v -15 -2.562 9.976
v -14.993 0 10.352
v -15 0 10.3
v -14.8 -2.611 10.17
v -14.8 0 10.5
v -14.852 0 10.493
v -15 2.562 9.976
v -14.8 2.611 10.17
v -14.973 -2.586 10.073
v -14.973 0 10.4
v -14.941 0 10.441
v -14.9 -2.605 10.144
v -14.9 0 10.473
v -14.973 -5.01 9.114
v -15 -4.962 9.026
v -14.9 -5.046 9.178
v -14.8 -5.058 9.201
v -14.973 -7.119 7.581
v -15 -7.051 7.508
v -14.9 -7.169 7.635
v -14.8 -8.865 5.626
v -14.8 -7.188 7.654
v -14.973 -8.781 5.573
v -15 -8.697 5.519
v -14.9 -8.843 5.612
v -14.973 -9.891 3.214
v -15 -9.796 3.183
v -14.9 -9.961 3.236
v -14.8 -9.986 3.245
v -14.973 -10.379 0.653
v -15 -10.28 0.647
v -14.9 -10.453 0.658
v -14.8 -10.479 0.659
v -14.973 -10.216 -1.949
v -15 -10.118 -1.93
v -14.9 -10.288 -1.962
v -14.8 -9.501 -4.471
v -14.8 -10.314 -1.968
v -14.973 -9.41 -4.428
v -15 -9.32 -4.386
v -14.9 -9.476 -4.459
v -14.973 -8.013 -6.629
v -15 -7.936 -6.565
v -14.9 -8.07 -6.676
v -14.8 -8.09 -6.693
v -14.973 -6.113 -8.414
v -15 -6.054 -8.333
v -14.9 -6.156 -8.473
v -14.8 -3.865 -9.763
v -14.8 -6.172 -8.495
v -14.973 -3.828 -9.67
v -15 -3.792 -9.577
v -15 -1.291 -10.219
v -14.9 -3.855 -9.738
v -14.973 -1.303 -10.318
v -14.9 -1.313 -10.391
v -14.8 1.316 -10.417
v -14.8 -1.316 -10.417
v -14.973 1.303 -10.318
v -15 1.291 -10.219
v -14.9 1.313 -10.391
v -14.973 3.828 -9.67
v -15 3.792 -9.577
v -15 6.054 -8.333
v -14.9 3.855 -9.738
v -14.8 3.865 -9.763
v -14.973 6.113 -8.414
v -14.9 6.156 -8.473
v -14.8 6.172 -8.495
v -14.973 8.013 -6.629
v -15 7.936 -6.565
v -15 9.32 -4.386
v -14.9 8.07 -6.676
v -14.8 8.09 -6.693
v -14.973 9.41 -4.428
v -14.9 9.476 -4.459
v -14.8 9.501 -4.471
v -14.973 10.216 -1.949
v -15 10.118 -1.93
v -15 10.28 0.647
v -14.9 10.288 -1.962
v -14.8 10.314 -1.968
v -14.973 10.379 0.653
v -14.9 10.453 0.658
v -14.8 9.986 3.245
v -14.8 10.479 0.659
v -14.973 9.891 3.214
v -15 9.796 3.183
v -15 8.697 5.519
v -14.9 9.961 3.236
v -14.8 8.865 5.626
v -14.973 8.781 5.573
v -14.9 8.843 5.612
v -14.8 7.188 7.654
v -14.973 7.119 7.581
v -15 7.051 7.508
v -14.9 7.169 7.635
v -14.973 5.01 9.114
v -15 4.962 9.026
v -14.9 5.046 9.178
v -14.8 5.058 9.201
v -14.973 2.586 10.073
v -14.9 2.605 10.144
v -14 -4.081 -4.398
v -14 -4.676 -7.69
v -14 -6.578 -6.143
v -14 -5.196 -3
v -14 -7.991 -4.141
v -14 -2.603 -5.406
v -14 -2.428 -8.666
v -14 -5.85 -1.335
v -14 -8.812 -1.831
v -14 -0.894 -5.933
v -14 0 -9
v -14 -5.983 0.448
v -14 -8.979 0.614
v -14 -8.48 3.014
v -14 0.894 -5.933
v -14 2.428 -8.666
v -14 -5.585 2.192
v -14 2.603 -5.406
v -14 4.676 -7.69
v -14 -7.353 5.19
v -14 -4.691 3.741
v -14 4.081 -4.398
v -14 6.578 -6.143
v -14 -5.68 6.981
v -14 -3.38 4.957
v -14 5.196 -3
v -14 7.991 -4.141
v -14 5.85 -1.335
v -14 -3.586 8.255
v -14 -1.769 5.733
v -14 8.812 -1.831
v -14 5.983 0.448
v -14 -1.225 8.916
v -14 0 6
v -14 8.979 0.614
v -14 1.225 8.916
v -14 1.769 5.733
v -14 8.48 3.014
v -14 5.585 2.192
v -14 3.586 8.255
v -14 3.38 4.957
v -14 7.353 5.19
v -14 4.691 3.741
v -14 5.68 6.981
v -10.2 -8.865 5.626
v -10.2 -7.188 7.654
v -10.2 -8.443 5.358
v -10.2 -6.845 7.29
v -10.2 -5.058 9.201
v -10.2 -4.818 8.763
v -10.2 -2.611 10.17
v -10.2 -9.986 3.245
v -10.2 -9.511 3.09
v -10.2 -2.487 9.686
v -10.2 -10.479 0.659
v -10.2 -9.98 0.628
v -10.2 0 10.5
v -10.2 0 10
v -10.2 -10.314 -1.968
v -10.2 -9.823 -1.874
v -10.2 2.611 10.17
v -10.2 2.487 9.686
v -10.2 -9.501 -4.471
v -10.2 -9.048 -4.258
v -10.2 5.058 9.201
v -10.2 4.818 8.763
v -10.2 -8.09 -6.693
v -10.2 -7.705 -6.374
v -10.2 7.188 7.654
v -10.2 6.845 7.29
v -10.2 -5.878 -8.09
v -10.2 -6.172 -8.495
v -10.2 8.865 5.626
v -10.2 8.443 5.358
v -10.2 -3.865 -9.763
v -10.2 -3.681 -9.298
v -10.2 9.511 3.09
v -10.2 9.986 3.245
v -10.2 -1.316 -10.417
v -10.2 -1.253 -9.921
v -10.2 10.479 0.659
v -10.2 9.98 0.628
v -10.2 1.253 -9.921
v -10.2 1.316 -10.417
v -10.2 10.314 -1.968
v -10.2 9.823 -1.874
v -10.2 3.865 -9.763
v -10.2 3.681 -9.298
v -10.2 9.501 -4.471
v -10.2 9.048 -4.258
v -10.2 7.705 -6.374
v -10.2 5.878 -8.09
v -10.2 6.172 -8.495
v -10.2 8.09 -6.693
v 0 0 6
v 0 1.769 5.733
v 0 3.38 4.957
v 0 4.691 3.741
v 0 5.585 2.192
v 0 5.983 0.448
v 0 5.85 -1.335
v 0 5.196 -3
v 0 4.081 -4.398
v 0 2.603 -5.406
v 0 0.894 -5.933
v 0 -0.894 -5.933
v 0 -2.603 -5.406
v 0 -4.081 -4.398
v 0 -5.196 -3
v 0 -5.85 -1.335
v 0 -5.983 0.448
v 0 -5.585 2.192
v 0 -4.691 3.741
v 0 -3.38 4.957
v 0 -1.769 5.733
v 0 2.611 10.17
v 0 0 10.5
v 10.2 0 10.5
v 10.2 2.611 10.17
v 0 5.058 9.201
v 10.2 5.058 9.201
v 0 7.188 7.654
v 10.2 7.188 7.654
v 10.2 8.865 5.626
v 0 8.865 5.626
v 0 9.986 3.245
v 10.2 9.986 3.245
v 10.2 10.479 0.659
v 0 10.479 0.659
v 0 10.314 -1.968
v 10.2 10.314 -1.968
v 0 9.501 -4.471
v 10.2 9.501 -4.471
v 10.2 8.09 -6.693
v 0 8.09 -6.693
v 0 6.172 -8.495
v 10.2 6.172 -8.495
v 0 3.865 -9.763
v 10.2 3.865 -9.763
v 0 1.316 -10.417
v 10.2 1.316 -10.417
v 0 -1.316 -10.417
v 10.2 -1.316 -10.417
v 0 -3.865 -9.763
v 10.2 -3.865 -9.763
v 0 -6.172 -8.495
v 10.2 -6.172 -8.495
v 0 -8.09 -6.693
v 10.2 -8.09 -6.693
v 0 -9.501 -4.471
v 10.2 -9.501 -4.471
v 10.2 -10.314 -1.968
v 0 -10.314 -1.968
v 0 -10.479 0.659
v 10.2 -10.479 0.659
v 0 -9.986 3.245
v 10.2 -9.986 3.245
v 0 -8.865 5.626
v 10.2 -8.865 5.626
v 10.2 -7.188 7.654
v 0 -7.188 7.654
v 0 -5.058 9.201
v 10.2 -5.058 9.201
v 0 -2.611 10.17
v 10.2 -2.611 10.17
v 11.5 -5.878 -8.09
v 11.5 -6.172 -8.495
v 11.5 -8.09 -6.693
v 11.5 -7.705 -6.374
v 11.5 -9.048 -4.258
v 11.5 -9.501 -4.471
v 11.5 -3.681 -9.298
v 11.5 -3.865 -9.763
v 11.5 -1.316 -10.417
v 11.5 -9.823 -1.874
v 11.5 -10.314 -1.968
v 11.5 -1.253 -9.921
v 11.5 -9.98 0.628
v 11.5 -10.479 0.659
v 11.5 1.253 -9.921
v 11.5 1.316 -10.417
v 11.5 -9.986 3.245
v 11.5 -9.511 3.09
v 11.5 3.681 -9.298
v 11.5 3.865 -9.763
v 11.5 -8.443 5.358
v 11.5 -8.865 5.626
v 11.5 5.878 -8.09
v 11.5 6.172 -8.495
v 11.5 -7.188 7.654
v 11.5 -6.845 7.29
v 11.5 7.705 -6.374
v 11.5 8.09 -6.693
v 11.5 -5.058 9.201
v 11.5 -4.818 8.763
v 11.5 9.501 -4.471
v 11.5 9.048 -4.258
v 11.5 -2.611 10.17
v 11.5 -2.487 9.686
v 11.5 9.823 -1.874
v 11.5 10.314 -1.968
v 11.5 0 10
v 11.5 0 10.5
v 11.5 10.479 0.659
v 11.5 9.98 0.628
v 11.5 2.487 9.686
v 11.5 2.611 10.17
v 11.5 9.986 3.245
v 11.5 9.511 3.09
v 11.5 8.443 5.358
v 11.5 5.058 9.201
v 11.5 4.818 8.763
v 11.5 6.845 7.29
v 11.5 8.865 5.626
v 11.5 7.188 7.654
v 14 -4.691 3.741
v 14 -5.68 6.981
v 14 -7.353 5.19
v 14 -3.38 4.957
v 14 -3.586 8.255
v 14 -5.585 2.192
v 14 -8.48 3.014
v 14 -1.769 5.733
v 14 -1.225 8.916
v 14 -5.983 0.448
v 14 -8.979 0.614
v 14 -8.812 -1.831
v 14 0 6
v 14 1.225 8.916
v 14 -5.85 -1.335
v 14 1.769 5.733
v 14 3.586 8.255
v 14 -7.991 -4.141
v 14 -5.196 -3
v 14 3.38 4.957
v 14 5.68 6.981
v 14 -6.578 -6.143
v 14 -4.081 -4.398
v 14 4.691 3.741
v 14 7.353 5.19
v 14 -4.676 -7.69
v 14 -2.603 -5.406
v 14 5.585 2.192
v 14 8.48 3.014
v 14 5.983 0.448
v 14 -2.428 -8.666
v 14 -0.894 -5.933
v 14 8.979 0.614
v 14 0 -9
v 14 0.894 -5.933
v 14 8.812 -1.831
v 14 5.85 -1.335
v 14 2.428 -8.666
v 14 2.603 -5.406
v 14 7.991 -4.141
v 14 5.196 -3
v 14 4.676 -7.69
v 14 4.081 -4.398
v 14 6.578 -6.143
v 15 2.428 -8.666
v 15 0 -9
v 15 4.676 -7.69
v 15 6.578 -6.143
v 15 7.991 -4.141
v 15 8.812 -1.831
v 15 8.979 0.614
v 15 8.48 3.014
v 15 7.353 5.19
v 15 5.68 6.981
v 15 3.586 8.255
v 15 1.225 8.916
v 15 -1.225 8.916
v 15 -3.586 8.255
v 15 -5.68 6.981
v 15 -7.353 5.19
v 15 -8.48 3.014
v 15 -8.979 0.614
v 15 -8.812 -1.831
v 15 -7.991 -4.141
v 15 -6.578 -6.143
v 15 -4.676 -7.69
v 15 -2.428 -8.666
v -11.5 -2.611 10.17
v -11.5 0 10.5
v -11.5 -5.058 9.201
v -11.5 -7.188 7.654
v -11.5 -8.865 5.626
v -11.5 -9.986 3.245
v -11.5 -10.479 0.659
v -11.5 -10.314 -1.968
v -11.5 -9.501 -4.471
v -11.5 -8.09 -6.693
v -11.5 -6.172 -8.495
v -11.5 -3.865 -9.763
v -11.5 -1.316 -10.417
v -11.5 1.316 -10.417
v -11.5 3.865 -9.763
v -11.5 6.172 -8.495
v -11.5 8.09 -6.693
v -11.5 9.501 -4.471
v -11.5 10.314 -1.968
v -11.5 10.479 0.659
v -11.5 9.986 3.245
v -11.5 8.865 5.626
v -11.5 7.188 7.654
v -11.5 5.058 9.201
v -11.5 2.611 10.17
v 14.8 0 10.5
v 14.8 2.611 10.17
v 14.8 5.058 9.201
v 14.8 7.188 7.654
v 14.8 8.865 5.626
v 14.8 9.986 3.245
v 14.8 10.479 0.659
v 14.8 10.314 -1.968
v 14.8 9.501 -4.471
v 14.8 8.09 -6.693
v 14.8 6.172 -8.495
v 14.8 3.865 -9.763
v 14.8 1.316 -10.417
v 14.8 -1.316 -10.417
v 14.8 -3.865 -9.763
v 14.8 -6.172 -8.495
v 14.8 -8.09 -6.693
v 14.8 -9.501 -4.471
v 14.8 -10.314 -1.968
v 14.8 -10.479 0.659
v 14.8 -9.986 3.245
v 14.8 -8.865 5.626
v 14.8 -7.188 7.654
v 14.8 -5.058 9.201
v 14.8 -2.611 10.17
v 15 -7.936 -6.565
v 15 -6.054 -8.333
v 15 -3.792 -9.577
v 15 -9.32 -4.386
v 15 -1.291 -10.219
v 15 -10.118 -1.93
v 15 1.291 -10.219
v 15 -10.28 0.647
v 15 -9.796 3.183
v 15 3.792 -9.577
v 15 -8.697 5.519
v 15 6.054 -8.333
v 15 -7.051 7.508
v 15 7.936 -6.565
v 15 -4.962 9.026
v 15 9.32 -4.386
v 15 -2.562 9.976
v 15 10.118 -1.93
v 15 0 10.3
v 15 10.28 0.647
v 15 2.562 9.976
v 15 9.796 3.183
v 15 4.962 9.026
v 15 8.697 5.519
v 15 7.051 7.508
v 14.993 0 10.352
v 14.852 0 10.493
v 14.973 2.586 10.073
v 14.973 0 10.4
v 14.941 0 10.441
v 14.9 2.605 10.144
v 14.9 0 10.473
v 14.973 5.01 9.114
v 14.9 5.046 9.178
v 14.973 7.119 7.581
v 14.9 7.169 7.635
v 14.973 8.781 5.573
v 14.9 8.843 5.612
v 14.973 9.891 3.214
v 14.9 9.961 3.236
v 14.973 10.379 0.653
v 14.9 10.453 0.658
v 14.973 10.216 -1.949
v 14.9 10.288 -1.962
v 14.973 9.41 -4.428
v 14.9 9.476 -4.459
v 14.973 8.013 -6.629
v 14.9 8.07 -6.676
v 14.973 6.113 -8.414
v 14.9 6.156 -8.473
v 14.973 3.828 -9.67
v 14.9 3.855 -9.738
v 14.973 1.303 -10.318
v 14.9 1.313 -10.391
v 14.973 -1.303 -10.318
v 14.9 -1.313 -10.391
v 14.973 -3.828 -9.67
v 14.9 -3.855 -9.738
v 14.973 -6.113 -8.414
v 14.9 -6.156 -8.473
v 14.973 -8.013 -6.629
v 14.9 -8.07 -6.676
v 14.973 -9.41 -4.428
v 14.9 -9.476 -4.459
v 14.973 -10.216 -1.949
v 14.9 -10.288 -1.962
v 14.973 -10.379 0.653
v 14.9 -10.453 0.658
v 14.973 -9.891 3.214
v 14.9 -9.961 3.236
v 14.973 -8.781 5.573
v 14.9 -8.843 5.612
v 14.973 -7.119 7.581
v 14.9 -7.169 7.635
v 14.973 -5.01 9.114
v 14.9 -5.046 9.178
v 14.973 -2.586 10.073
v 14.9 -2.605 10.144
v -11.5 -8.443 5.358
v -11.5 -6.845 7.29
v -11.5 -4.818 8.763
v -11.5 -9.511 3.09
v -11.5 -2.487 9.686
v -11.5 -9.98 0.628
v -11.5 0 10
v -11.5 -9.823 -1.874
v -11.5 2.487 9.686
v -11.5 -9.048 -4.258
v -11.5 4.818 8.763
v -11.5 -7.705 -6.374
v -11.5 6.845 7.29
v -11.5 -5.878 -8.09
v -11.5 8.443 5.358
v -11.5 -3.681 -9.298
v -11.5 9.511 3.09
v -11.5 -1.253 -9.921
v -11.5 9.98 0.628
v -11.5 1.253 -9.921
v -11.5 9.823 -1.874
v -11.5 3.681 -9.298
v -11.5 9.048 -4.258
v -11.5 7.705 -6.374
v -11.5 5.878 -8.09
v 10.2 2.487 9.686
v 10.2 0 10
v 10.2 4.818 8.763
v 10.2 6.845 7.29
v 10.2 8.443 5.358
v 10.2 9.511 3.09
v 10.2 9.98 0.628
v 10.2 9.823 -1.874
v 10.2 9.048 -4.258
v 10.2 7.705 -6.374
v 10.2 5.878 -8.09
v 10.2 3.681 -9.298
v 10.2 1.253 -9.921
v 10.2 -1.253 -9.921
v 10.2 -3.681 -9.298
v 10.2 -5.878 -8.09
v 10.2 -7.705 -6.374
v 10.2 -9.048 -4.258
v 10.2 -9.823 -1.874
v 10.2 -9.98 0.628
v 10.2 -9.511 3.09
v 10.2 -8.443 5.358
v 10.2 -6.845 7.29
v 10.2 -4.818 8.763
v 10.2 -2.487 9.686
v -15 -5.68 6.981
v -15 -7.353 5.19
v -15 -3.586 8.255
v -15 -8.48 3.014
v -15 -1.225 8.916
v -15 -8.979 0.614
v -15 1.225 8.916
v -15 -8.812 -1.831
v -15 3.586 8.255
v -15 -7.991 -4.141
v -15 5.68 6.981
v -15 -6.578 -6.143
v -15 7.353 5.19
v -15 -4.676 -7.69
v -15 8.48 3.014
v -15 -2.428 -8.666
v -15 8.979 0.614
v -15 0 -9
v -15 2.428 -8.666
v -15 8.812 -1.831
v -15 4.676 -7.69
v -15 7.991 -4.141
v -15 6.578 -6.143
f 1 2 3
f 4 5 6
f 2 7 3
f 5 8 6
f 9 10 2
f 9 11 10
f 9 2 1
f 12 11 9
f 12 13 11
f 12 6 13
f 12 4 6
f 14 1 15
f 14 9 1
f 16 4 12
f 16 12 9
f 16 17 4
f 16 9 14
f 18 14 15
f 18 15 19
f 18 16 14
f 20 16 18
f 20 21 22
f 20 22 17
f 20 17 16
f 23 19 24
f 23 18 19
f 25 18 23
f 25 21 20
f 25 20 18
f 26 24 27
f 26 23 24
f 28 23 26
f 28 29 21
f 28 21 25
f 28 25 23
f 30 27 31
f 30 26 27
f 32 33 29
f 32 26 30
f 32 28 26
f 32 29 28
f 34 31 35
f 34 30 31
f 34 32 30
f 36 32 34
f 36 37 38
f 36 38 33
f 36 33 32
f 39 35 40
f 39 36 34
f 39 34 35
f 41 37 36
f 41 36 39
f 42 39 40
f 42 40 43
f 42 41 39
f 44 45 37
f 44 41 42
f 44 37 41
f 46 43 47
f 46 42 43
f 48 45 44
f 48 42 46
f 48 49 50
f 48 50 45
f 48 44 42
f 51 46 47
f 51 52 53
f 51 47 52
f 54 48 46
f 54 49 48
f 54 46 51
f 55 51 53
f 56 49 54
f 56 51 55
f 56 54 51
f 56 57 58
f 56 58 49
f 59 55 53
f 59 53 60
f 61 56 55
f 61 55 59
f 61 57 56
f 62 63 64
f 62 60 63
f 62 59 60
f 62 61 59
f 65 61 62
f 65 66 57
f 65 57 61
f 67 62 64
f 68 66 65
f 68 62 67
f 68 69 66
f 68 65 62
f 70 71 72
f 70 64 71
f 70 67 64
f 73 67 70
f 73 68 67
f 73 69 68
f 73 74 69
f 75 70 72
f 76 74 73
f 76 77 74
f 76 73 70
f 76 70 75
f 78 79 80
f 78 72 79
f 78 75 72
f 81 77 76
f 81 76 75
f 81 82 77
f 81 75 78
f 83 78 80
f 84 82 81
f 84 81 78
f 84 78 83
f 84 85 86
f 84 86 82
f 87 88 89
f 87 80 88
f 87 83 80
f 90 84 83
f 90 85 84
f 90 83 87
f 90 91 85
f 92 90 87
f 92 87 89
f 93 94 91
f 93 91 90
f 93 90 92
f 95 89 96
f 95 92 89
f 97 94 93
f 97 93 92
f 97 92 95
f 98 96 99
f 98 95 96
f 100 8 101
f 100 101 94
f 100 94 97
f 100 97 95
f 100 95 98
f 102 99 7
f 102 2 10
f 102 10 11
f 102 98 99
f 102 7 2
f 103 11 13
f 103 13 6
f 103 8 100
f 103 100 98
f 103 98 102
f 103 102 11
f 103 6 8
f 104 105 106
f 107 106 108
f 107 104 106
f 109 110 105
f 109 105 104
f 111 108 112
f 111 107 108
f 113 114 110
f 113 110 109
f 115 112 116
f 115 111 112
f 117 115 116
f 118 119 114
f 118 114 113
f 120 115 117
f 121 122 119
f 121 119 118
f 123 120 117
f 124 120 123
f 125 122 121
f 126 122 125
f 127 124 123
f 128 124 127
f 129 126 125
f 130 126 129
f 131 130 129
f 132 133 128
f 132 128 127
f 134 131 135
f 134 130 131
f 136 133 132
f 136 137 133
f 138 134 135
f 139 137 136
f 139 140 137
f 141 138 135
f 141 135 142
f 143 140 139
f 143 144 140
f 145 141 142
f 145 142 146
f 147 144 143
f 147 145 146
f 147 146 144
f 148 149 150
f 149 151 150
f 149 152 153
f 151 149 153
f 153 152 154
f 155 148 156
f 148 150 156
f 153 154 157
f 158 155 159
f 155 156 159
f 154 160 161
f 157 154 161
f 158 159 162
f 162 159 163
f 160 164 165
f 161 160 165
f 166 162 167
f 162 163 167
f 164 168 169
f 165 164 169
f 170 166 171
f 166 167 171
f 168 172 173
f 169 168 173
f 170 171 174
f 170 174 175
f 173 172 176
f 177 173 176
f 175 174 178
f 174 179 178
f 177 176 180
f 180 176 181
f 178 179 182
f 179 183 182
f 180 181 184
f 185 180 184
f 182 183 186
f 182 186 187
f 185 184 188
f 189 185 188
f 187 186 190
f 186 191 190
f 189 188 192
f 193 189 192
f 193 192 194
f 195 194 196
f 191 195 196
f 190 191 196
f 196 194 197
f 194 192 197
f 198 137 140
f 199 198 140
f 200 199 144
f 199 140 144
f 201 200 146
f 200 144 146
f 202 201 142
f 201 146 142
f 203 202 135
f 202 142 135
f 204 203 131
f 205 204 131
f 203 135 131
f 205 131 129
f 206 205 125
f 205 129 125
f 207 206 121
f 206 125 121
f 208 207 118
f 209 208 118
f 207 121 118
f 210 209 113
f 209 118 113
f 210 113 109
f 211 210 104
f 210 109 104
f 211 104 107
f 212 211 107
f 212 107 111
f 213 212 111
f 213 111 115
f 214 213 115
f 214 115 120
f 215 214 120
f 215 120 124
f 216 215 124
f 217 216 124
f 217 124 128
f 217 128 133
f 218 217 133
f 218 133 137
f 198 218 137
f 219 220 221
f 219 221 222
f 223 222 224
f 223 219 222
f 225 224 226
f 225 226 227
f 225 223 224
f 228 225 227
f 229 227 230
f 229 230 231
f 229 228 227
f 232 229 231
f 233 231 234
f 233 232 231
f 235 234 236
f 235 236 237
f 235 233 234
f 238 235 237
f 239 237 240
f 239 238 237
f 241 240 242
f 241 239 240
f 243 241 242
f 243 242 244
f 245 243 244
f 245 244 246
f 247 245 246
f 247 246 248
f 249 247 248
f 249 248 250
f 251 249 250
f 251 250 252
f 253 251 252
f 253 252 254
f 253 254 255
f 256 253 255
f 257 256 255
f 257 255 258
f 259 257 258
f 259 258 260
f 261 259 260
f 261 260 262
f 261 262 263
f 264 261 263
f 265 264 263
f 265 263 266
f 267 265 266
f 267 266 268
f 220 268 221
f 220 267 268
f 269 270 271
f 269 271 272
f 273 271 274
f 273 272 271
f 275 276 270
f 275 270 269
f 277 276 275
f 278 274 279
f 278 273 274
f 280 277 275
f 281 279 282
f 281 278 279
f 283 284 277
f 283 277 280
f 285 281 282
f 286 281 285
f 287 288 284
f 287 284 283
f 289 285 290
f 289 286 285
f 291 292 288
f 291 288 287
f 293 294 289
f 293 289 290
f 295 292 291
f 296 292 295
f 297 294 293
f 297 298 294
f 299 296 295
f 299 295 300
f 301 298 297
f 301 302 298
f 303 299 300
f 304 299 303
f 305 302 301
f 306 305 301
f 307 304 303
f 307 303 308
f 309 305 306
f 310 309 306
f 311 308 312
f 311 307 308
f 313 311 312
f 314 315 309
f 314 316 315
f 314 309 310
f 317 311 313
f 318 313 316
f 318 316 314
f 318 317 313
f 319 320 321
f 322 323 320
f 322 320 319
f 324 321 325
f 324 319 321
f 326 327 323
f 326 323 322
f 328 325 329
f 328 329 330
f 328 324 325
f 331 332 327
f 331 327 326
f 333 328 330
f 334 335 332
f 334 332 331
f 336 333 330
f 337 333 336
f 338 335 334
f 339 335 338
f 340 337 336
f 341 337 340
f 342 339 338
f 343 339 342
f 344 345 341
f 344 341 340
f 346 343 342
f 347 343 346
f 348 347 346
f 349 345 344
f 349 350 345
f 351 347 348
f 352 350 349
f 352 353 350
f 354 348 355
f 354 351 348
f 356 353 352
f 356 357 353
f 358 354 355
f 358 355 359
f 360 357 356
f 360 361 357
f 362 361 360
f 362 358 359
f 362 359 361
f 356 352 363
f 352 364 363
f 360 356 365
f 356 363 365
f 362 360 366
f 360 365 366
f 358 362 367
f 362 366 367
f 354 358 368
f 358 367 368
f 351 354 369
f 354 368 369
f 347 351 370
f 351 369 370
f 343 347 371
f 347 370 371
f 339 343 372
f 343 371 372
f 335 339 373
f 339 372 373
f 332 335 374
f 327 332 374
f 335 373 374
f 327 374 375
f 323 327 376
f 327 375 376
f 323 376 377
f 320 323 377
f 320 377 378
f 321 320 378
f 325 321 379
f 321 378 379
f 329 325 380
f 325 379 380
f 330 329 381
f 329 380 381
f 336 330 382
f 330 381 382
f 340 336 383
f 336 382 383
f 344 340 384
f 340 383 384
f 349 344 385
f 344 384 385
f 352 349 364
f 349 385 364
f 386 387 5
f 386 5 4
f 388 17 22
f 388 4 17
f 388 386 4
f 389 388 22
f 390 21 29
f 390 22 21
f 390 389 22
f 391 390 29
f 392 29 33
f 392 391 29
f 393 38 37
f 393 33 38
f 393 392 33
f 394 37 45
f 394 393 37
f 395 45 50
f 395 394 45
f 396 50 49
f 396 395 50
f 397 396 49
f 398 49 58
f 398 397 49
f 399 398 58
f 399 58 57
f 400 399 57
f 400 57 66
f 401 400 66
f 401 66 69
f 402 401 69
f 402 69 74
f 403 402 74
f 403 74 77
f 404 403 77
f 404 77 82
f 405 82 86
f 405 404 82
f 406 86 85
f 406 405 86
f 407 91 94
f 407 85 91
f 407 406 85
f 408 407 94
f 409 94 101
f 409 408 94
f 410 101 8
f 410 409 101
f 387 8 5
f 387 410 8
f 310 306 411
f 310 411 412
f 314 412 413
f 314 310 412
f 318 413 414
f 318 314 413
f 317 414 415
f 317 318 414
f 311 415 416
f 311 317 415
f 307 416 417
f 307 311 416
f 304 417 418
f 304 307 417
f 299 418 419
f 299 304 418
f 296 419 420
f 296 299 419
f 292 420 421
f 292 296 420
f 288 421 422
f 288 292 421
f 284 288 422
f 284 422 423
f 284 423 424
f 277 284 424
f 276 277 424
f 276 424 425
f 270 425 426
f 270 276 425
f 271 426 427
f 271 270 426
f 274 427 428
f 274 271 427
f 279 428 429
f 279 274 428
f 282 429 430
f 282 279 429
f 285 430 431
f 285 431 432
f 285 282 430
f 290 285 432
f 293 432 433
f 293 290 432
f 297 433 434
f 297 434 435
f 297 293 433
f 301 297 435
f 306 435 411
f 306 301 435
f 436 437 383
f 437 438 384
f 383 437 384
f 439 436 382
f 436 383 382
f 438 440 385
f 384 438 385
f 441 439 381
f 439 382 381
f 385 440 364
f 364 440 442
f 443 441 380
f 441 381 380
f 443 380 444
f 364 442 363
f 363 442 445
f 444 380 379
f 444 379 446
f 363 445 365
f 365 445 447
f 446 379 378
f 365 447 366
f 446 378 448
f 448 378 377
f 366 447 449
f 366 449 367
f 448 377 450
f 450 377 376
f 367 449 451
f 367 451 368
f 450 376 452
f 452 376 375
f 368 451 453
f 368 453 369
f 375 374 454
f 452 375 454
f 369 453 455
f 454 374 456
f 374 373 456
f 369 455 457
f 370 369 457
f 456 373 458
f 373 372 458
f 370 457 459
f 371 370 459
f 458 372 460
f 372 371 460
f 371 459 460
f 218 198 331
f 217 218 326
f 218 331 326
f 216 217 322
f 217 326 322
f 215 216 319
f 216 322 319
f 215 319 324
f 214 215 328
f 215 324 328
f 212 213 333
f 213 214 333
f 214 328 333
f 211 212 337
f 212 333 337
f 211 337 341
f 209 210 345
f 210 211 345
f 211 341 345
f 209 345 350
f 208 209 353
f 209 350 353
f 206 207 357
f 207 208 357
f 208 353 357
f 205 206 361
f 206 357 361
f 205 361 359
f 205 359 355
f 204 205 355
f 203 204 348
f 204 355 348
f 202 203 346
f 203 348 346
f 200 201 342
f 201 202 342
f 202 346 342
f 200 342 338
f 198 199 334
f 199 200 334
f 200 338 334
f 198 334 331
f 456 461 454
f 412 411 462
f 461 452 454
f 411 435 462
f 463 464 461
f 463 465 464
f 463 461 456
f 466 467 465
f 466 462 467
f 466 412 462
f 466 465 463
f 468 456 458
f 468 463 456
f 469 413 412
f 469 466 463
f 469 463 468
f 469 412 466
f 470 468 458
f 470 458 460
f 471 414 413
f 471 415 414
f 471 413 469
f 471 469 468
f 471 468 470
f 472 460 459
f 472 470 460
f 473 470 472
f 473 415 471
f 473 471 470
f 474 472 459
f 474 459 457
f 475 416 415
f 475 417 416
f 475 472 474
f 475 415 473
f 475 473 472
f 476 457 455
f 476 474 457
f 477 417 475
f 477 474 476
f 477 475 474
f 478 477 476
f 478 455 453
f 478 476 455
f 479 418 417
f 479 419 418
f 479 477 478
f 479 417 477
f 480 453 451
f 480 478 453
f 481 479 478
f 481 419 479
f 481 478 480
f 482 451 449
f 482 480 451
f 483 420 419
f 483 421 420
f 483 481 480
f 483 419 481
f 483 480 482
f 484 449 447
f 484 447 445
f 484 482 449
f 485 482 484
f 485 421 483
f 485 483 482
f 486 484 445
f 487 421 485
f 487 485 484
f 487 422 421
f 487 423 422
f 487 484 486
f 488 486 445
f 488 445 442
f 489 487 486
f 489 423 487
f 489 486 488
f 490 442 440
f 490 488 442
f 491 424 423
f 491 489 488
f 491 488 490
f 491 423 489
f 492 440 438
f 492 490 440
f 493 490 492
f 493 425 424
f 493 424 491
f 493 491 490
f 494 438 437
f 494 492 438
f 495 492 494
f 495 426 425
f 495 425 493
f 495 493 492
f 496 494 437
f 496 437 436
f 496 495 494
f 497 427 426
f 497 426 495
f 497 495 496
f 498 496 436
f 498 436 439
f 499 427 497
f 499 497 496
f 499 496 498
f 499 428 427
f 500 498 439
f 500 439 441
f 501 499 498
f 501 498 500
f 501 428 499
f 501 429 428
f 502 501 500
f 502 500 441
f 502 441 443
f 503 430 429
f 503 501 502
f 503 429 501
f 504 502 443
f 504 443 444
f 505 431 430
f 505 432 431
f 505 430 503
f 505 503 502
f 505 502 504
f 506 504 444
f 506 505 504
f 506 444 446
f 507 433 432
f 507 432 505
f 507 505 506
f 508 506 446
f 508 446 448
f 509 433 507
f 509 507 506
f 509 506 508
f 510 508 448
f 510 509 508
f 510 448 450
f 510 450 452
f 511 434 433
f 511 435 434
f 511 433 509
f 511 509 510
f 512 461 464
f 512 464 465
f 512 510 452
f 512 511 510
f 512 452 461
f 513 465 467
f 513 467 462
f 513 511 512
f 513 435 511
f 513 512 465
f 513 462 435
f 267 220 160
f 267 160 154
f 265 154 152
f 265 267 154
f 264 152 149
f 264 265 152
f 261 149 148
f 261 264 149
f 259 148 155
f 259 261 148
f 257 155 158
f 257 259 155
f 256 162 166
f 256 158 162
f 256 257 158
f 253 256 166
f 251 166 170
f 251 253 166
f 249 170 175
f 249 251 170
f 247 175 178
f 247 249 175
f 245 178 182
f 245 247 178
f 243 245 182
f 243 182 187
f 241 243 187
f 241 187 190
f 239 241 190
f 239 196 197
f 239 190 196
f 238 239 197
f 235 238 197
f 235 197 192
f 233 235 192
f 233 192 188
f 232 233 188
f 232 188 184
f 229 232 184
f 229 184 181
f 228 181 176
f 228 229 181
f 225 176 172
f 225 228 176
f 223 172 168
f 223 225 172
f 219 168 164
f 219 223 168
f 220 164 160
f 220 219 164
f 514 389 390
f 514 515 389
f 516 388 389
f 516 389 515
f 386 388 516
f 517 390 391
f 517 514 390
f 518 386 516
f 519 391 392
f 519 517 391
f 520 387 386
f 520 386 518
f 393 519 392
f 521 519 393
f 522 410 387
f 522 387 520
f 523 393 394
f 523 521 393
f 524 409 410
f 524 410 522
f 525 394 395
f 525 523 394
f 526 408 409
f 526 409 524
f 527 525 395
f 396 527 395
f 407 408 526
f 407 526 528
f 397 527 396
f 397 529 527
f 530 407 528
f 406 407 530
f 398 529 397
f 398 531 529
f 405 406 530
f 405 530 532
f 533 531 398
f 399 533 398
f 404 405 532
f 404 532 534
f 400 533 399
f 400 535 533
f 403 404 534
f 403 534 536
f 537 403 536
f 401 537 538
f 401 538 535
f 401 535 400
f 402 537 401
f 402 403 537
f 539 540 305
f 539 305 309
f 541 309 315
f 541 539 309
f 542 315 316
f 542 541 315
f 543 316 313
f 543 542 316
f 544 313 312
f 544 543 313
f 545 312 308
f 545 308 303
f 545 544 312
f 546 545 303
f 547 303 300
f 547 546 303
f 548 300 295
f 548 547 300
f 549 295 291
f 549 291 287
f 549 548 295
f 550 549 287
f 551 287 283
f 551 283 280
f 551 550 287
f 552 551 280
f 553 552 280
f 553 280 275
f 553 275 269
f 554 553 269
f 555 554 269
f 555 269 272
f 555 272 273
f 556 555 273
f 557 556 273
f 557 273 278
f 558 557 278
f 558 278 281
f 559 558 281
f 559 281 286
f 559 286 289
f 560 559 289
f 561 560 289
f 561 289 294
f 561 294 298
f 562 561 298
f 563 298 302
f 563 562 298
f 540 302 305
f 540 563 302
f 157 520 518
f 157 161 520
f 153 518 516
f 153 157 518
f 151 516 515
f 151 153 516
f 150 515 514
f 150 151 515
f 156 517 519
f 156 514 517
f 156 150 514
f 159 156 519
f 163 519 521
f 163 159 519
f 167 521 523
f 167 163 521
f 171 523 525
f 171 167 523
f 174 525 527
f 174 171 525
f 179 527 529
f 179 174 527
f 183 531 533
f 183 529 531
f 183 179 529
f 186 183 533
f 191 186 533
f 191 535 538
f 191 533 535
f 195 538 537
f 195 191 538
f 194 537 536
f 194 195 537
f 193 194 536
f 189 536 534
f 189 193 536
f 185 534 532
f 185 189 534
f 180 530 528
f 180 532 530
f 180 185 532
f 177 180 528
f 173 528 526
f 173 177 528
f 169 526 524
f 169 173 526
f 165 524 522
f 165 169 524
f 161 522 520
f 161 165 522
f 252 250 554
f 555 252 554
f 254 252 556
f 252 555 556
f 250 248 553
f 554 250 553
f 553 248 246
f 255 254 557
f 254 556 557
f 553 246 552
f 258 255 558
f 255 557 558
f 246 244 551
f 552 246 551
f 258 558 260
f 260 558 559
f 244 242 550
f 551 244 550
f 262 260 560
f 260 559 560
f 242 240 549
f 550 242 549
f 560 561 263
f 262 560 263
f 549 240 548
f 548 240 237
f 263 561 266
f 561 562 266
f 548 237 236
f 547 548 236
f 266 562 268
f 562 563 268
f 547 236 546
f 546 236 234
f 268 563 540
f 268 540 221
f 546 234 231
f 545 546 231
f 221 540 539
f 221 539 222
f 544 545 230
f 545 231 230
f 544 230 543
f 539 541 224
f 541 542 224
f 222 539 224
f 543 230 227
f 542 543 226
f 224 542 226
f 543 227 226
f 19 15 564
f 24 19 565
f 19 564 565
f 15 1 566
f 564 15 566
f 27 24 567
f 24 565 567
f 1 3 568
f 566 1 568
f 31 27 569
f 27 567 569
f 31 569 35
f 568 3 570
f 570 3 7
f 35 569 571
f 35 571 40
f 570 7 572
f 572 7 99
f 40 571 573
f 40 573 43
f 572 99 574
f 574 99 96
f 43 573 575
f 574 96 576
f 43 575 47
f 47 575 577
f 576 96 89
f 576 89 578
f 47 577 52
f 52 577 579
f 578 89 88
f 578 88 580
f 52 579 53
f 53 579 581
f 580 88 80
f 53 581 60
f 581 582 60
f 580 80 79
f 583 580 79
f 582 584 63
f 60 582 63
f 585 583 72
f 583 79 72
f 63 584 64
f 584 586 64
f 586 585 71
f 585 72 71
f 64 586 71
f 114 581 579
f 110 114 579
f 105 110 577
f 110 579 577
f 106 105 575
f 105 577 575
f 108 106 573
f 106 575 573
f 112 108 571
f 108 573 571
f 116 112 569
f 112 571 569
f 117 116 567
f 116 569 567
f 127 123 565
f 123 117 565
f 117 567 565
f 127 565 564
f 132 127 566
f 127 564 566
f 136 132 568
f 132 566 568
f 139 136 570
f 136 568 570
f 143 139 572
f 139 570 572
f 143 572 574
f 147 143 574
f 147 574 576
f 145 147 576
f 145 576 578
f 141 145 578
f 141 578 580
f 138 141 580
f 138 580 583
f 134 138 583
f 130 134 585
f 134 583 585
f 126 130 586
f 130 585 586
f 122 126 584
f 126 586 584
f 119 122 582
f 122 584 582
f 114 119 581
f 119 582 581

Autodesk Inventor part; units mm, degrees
ref_plane "YZ Plane" through (0, 0, 0) normal (1, 0, 0) x (0, 1, 0)
ref_plane "XZ Plane" through (0, 0, 0) normal (0, 1, 0) x (-1, 0, 0)
ref_plane "XY Plane" through (0, 0, 0) normal (0, 0, 1) x (1, 0, 0)
sketch "Schizzo1" plane through (0, 0, 0) normal (0, 1, 0) x (-1, 0, 0)
  line L0 (-15, 6) -> (-15, 10.5)
  line L1 (-15, 10.5) -> (-11.5, 10.5)
  line L2 (-11.5, 10.5) -> (-11.5, 10)
  line L3 (-11.5, 10) -> (-10.2, 10)
  line L4 (-10.2, 10) -> (-10.2, 10.5)
  line L5 (-10.2, 10.5) -> (0, 10.5)
  line L6 (0, 10.5) -> (0, 6)
  line L7 (0, 6) -> (-15, 6)
  line L8 (0, 0) -> (5.7518, 0)
  dimension "d0" = 12
  dimension "d2" = 21
  dimension "d3" = 15
  dimension "d4" = 11.5
  dimension "d5" = 1.3
  dimension "d6" = 20
revolve "Rivoluzione1" add sketch "Schizzo1" angle 360 about axis through (0, 0, 0) along (-1, 0, 0)
fillet "Raccordo1" radius 0.2 1 edges at (15, 0, -10.5)
sketch "Schizzo2" plane through (15, 0, 0) normal (1, 0, 0) x (0, 0, -1)
  circle A0 centre (0, 0) radius 10.3 projected
  circle A1 centre (0, 0) radius 9
  dimension "d13" = 18
extrude "Estrusione2" cut sketch "Schizzo2" against normal blind 1 contours A1
mirror "Specchio1" about plane through (0, 0, 8.25) normal (-1, 0, 0)
properties part number "LM10UU"
